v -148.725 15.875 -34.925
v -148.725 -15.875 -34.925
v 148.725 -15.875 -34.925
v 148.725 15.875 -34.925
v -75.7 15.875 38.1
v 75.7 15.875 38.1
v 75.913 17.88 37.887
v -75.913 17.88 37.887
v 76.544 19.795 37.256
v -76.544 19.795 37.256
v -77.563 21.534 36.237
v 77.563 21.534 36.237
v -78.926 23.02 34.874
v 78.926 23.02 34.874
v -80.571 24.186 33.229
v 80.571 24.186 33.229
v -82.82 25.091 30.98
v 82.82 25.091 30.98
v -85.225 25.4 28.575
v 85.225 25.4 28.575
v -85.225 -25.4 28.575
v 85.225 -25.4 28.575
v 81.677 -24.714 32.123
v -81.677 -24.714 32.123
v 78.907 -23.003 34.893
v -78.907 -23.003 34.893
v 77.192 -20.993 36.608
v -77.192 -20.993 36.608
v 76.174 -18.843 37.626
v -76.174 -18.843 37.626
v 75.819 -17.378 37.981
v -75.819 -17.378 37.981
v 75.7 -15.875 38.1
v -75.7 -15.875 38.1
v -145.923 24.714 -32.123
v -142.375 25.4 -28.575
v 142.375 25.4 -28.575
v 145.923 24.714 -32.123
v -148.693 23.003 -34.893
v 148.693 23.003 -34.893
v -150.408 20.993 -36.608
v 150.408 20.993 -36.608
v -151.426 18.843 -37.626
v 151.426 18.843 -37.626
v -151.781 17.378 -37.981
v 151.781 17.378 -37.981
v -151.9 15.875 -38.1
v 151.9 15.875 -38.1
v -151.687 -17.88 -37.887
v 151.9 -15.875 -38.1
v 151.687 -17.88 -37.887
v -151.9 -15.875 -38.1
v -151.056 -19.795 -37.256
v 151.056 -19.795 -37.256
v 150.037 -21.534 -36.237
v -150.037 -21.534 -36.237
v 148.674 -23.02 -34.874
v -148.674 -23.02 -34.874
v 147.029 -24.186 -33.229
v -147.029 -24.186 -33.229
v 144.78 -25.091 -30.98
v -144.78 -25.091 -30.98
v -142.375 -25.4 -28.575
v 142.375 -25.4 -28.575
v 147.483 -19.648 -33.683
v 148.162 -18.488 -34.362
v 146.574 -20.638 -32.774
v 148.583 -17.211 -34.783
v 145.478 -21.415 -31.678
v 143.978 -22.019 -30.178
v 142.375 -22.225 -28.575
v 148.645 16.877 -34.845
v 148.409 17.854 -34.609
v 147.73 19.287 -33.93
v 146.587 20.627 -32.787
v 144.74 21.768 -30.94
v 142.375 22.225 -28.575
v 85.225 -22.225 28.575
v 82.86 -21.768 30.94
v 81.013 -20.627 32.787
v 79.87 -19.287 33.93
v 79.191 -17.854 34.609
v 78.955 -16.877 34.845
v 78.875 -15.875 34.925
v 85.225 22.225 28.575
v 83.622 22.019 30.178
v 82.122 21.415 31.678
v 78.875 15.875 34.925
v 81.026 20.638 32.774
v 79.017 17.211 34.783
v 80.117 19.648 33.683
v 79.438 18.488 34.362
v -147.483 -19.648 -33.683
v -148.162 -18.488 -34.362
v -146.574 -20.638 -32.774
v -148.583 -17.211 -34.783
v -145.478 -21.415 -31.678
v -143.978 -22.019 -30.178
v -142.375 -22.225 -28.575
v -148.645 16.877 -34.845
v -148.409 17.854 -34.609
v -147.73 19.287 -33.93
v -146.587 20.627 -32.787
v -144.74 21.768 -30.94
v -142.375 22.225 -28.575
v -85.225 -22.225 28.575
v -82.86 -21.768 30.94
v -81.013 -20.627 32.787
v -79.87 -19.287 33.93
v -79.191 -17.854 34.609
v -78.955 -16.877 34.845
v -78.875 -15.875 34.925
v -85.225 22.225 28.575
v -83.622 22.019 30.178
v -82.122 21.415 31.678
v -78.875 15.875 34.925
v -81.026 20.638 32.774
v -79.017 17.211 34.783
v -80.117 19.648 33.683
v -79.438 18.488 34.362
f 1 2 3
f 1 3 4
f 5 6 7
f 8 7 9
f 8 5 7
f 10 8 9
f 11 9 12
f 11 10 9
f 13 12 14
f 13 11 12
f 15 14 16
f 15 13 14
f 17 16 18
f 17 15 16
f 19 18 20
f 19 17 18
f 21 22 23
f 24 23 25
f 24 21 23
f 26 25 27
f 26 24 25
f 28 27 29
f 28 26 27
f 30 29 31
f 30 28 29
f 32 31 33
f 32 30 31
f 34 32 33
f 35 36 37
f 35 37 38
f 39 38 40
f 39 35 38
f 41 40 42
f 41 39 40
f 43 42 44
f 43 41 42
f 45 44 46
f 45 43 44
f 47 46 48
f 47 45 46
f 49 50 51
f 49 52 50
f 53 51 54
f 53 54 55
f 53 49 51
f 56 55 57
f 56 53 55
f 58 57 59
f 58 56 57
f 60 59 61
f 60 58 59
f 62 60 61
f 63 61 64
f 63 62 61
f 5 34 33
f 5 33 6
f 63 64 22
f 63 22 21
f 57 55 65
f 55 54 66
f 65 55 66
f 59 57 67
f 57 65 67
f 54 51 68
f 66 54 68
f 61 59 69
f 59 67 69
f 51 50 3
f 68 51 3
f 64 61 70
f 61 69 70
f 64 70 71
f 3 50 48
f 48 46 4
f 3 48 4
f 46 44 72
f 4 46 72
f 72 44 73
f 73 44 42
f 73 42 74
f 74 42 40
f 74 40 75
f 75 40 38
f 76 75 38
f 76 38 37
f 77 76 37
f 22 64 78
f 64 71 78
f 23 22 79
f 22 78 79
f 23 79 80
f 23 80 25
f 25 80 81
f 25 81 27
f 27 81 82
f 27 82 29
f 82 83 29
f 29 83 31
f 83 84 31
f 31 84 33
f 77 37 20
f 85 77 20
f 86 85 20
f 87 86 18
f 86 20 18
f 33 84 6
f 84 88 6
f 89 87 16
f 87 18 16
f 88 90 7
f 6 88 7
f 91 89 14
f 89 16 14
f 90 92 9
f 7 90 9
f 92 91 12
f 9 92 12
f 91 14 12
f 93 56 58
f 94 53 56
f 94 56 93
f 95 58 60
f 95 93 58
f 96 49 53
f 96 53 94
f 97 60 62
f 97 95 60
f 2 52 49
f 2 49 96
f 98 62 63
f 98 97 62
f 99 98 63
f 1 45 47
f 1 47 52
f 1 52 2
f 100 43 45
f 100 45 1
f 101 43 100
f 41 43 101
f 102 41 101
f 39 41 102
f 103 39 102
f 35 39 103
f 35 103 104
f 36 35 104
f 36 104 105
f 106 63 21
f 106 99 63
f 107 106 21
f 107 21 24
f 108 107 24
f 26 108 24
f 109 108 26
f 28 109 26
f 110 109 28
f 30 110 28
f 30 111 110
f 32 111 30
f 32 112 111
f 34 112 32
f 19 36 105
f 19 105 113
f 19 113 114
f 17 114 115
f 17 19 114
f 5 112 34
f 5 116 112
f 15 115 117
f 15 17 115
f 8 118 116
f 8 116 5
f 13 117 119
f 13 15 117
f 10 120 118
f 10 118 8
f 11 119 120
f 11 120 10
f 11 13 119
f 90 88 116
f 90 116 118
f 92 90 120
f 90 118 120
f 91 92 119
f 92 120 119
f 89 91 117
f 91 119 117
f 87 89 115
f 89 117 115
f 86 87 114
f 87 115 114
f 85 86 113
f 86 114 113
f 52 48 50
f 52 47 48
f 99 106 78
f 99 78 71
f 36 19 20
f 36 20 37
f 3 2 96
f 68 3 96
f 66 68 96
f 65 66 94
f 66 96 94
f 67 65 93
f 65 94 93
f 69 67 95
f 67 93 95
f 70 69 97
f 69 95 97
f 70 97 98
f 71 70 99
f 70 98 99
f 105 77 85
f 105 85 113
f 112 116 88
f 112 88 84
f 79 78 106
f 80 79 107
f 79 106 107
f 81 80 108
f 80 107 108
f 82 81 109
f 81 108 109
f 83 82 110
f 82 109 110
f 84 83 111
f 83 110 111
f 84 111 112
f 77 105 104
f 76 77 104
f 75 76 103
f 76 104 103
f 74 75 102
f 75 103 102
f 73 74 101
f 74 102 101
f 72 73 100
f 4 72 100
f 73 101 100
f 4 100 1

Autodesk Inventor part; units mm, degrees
ref_plane "YZ Plane" through (0, 0, 0) normal (1, 0, 0) x (0, 1, 0)
ref_plane "XZ Plane" through (0, 0, 0) normal (0, 1, 0) x (-1, 0, 0)
ref_plane "XY Plane" through (0, 0, 0) normal (0, 0, 1) x (1, 0, 0)
sketch "Sketch1" plane through (0, 0, 0) normal (1, 0, 0) x (0, 1, 0)
  line L0 (-15.875, 38.1) -> (15.875, 38.1)
  line L1 (25.4, 28.575) -> (25.4, -28.575)
  line L2 (15.875, -38.1) -> (-15.875, -38.1)
  line L3 (-25.4, -28.575) -> (-25.4, 28.575)
  line L4 (-25.4, 38.1) -> (25.4, -38.1) construction
  line L5 (25.4, 38.1) -> (-25.4, -38.1) construction
  arc A0 (25.4, 28.575) -> (15.875, 38.1) centre (15.875, 28.575) ccw
  arc A1 (-15.875, 38.1) -> (-25.4, 28.575) centre (-15.875, 28.575) ccw
  arc A2 (-25.4, -28.575) -> (-15.875, -38.1) centre (-15.875, -28.575) ccw
  arc A3 (15.875, -38.1) -> (25.4, -28.575) centre (15.875, -28.575) ccw
  line L6 (22.225, -28.575) -> (22.225, 28.575)
  arc A4 (22.225, 28.575) -> (15.875, 34.925) centre (15.875, 28.575) ccw
  line L7 (15.875, 34.925) -> (-15.875, 34.925)
  arc A5 (-15.875, 34.925) -> (-22.225, 28.575) centre (-15.875, 28.575) ccw
  line L8 (-22.225, 28.575) -> (-22.225, -28.575)
  arc A6 (-22.225, -28.575) -> (-15.875, -34.925) centre (-15.875, -28.575) ccw
  line L9 (-15.875, -34.925) -> (15.875, -34.925)
  arc A7 (15.875, -34.925) -> (22.225, -28.575) centre (15.875, -28.575) ccw
  point P0 (0, 0)
  dimension "d0" = 76.2
  dimension "d1" = 50.8
  dimension "d2" = 9.525
  dimension "d3" = 3.175
extrude "Extrusion1" add sketch "Sketch1" along normal mid plane 303.8
sketch "Sketch2" plane through (-151.9, 25.4, 28.575) normal (0, 1, 0) x (1, 0, 0)
  line L0 (303.8, 57.15) -> (303.8, 66.675) projected
  line L1 (303.8, 66.675) -> (227.6, -9.525)
  line L2 (0, -9.525) -> (303.8, -9.525) projected
  line L3 (303.8, 66.675) -> (411.5631, 66.675) construction
  line L4 (227.6, -9.525) -> (303.8, -9.525)
  line L5 (303.8, -9.525) -> (303.8, 66.675)
  line L6 (151.9, 28.575) -> (151.9, -9.525)
  line L7 (0, 66.675) -> (76.2, -9.525)
  line L8 (76.2, -9.525) -> (0, -9.525)
  line L9 (0, -9.525) -> (0, 66.675)
  dimension "d6" = 135
extrude "Extrusion2" cut sketch "Sketch2" against normal through all
equation "\"d0\" = stockWidth"
equation "\"d1\" = stockHeight"
equation "\"d2\" = stockRad"
equation "\"d3\" = stockGuage"
equation "\"height\" = 203.2"
equation "\"shaftDiam\" = 6.35"
equation "\"shaftSpace\" = 1.5875"
equation "\"stageSpace\" = 2.54"
equation "\"stageAngle\" = 15deg"
equation "\"stockHeight\" = 50.8"
equation "\"stockWidth\" = 76.2"
equation "\"stockRad\" = 9.525"
equation "\"stockGuage\" = 3.175"
equation "\"groundActu\" = 304.8"
equation "\"baseWidth\" = 1066.8"
equation "\"baseDepth\" = 254"
equation "\"capThickness\" = 3.175"
equation "\"sup1Ang\" = 22.619865deg"
equation "\"sup1Len\" = 660.4"
equation "\"supVertLen\" = 955.13561"
equation "\"sup2Ang\" = 8.959949deg"
equation "\"sup2Len\" = 2079.37366"
equation "\"supSideAng\" = 19.376933deg"
equation "\"supSideLen\" = 1531.12879"
equation "\"FlangeDiam\" = 12.7"
equation "\"bearingDiam\" = 9.5504"
equation "\"FlangeDepth\" = 1.5875"
equation "\"smallFilet\" = 0.39687"
equation "\"thickness\" = 12.7"
equation "\"ringDiam\" = 96.46608"
properties part number "back bar" material "Aluminum 6061"
